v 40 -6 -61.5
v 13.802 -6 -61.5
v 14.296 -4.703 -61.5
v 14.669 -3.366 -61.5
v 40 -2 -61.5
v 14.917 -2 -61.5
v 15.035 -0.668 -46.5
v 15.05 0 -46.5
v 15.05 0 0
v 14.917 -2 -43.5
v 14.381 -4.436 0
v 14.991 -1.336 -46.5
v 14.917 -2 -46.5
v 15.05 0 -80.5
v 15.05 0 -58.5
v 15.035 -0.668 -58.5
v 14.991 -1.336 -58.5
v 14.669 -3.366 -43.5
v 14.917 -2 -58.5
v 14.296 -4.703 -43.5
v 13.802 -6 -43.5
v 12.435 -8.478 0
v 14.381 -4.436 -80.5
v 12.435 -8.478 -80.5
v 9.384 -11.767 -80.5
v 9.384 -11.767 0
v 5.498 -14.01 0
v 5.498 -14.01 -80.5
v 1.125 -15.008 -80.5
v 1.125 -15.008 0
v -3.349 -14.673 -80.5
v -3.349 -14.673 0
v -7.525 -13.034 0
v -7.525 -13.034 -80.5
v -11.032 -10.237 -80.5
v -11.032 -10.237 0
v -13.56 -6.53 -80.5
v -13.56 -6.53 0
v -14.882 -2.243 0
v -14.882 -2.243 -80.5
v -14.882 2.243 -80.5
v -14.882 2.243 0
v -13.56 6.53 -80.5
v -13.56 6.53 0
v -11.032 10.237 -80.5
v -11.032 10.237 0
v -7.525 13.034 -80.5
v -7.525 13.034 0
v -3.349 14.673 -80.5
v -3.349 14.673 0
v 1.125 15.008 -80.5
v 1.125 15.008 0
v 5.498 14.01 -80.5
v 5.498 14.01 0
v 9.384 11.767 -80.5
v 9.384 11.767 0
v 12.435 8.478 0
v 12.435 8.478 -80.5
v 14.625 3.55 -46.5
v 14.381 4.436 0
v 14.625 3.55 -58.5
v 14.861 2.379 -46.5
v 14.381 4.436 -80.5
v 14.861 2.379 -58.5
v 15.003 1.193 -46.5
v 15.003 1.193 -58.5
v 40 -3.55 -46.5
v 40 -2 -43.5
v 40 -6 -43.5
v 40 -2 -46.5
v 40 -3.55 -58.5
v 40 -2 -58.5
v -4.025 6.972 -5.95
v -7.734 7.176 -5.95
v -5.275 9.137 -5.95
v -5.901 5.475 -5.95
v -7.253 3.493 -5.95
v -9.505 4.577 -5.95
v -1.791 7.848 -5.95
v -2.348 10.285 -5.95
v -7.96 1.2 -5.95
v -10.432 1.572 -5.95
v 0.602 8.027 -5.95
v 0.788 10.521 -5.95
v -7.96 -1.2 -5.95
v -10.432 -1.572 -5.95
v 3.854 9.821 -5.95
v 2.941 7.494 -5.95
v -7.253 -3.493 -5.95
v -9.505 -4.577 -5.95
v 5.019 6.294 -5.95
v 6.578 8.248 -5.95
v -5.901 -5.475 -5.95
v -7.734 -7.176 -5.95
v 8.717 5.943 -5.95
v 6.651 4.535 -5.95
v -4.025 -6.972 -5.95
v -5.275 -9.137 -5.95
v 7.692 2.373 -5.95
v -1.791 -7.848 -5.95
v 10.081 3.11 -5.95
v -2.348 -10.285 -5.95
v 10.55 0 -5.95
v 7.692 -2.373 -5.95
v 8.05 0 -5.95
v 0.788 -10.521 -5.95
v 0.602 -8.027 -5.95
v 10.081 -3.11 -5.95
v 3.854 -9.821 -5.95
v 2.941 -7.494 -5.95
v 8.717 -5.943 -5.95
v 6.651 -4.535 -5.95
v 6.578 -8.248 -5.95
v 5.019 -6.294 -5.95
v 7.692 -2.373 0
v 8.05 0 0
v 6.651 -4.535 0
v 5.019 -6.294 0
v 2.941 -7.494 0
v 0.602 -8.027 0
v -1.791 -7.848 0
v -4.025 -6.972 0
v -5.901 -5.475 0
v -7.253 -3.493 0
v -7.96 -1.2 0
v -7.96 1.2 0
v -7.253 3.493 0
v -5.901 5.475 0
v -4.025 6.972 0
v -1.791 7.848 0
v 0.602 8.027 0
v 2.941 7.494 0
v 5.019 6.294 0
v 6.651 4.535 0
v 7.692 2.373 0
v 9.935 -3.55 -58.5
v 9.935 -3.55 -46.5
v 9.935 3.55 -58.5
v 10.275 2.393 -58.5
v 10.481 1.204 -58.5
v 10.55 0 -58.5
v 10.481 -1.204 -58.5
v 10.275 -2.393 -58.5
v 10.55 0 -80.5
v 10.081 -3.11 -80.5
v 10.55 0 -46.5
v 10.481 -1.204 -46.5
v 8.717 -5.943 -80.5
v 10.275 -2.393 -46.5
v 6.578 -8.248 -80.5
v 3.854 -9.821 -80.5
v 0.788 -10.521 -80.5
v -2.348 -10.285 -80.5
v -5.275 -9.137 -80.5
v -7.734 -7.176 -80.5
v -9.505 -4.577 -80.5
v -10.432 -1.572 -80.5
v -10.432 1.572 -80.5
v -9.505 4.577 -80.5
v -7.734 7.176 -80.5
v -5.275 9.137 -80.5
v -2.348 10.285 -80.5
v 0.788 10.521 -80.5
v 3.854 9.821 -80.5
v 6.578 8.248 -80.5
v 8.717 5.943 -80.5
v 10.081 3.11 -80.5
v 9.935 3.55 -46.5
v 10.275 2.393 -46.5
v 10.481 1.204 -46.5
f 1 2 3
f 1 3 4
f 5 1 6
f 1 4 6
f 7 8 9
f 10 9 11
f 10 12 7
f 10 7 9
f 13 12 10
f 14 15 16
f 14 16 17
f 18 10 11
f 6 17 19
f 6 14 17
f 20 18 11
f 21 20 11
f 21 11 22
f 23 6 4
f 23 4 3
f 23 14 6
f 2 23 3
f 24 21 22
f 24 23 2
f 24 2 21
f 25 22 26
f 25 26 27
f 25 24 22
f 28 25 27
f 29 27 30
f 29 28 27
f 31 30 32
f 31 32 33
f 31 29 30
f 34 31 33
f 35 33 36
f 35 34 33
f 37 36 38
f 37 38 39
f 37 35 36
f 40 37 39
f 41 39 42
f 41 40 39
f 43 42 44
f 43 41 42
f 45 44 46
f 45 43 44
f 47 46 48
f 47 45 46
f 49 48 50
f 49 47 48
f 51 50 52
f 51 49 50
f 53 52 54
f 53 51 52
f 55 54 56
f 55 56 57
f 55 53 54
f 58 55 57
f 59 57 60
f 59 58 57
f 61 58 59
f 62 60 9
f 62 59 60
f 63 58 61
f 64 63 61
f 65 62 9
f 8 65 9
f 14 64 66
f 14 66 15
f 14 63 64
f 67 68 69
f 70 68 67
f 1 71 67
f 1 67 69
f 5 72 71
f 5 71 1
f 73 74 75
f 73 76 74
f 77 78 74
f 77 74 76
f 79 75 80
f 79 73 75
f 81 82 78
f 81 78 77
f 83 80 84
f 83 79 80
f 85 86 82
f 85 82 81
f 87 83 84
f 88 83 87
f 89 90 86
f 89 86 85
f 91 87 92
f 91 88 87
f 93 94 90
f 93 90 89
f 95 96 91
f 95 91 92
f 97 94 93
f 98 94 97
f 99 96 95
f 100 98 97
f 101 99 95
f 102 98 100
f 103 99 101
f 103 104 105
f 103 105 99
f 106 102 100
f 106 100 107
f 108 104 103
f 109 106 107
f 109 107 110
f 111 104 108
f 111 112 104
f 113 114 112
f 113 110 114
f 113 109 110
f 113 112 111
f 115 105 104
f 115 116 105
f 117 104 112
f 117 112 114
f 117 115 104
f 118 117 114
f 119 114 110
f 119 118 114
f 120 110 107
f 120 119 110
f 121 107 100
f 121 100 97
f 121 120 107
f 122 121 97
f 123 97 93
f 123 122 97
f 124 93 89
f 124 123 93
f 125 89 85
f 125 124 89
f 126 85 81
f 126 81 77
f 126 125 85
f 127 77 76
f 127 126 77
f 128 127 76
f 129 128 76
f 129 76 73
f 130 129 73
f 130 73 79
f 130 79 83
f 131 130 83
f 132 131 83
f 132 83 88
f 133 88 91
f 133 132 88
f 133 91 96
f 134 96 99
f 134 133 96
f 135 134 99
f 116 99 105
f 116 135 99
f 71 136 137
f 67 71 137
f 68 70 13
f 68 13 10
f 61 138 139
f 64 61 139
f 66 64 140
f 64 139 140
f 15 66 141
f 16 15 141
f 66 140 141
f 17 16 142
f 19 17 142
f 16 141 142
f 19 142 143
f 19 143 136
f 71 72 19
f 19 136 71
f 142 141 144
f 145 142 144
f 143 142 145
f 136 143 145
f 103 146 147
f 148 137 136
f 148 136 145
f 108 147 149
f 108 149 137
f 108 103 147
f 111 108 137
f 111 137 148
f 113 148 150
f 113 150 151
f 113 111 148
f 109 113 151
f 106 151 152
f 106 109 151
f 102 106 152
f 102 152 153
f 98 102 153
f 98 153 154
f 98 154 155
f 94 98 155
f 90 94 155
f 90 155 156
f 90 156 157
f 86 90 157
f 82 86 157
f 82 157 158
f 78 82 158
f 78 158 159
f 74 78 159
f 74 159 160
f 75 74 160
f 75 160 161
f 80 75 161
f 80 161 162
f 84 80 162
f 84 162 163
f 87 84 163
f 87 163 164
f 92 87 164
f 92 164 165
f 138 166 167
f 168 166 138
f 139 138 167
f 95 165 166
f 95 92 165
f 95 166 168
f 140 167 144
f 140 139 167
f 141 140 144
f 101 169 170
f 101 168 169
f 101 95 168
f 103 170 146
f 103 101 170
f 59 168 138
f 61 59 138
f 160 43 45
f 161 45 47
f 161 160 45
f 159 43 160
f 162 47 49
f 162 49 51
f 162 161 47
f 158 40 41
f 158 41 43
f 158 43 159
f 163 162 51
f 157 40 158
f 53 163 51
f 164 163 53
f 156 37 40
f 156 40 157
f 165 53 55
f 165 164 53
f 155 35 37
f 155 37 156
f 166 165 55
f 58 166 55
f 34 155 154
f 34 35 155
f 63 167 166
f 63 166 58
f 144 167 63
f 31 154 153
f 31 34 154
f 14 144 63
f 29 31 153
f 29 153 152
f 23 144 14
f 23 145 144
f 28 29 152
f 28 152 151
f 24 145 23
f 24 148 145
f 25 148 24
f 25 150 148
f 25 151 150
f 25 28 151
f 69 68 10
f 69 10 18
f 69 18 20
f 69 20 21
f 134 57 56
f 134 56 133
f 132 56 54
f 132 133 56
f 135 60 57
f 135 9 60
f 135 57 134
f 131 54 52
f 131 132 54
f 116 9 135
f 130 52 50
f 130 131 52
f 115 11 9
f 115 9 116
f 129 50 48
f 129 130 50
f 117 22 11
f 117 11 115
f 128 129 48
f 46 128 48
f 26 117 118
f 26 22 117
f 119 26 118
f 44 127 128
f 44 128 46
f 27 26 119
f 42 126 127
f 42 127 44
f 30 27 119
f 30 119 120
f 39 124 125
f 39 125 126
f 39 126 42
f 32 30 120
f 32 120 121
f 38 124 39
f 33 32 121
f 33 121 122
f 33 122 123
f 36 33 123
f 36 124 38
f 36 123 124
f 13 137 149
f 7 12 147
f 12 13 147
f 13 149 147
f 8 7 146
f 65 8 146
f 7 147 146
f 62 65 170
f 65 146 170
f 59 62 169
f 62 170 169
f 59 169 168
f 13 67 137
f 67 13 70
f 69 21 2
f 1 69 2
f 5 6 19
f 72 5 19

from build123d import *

# Parameters (mm, degrees)
SKETCH2_W           = 12
SKETCH2_H           = 7.1
CUT_EXTRUDE2_DEPTH  = 30
BOSS_EXTRUDE1_DEPTH = 40
SKETCH5_R           = 10.55
CUT_EXTRUDE3_DEPTH  = 86.931397056


with BuildPart() as part:
    # Sketch1 → Revolve2 (revolve)
    with BuildSketch(Plane(origin=(0, 0, 0), x_dir=(1, 0, 0), z_dir=(0, 1, 0))):
        Polygon((8.05, 0), (15.05, 0), (15.05, 80.5), (10.55, 80.5), (10.55, 5.95), (8.05, 5.95), align=None)
    revolve(axis=Axis((0, 0, 0), (0, 0, -1)))

    # Sketch2 → Cut-Extrude2 (cut)
    with BuildSketch(Plane(origin=(0, 0, 0), x_dir=(0, 0, -1), z_dir=(1, 0, 0))):
        with Locations((52.5, 0)):
            Rectangle(SKETCH2_W, SKETCH2_H)
    extrude(amount=CUT_EXTRUDE2_DEPTH, mode=Mode.SUBTRACT)

    # Sketch3 → Boss-Extrude1 (add)
    with BuildSketch(Plane(origin=(0, 0, 0), x_dir=(0, 0, -1), z_dir=(1, 0, 0))):
        Polygon((46.5, -2), (43.5, -2), (43.5, -6), (52.5, -6), (61.5, -6), (61.5, -2), (58.5, -2), (58.5, -3.55), (46.5, -3.55), align=None)
    extrude(amount=BOSS_EXTRUDE1_DEPTH)

    # Sketch5 → Cut-Extrude3 (cut, through all)
    with BuildSketch(Plane.XY.offset(-5.95)):
        Circle(SKETCH5_R)
    extrude(amount=-CUT_EXTRUDE3_DEPTH, mode=Mode.SUBTRACT)


solid = part.part
